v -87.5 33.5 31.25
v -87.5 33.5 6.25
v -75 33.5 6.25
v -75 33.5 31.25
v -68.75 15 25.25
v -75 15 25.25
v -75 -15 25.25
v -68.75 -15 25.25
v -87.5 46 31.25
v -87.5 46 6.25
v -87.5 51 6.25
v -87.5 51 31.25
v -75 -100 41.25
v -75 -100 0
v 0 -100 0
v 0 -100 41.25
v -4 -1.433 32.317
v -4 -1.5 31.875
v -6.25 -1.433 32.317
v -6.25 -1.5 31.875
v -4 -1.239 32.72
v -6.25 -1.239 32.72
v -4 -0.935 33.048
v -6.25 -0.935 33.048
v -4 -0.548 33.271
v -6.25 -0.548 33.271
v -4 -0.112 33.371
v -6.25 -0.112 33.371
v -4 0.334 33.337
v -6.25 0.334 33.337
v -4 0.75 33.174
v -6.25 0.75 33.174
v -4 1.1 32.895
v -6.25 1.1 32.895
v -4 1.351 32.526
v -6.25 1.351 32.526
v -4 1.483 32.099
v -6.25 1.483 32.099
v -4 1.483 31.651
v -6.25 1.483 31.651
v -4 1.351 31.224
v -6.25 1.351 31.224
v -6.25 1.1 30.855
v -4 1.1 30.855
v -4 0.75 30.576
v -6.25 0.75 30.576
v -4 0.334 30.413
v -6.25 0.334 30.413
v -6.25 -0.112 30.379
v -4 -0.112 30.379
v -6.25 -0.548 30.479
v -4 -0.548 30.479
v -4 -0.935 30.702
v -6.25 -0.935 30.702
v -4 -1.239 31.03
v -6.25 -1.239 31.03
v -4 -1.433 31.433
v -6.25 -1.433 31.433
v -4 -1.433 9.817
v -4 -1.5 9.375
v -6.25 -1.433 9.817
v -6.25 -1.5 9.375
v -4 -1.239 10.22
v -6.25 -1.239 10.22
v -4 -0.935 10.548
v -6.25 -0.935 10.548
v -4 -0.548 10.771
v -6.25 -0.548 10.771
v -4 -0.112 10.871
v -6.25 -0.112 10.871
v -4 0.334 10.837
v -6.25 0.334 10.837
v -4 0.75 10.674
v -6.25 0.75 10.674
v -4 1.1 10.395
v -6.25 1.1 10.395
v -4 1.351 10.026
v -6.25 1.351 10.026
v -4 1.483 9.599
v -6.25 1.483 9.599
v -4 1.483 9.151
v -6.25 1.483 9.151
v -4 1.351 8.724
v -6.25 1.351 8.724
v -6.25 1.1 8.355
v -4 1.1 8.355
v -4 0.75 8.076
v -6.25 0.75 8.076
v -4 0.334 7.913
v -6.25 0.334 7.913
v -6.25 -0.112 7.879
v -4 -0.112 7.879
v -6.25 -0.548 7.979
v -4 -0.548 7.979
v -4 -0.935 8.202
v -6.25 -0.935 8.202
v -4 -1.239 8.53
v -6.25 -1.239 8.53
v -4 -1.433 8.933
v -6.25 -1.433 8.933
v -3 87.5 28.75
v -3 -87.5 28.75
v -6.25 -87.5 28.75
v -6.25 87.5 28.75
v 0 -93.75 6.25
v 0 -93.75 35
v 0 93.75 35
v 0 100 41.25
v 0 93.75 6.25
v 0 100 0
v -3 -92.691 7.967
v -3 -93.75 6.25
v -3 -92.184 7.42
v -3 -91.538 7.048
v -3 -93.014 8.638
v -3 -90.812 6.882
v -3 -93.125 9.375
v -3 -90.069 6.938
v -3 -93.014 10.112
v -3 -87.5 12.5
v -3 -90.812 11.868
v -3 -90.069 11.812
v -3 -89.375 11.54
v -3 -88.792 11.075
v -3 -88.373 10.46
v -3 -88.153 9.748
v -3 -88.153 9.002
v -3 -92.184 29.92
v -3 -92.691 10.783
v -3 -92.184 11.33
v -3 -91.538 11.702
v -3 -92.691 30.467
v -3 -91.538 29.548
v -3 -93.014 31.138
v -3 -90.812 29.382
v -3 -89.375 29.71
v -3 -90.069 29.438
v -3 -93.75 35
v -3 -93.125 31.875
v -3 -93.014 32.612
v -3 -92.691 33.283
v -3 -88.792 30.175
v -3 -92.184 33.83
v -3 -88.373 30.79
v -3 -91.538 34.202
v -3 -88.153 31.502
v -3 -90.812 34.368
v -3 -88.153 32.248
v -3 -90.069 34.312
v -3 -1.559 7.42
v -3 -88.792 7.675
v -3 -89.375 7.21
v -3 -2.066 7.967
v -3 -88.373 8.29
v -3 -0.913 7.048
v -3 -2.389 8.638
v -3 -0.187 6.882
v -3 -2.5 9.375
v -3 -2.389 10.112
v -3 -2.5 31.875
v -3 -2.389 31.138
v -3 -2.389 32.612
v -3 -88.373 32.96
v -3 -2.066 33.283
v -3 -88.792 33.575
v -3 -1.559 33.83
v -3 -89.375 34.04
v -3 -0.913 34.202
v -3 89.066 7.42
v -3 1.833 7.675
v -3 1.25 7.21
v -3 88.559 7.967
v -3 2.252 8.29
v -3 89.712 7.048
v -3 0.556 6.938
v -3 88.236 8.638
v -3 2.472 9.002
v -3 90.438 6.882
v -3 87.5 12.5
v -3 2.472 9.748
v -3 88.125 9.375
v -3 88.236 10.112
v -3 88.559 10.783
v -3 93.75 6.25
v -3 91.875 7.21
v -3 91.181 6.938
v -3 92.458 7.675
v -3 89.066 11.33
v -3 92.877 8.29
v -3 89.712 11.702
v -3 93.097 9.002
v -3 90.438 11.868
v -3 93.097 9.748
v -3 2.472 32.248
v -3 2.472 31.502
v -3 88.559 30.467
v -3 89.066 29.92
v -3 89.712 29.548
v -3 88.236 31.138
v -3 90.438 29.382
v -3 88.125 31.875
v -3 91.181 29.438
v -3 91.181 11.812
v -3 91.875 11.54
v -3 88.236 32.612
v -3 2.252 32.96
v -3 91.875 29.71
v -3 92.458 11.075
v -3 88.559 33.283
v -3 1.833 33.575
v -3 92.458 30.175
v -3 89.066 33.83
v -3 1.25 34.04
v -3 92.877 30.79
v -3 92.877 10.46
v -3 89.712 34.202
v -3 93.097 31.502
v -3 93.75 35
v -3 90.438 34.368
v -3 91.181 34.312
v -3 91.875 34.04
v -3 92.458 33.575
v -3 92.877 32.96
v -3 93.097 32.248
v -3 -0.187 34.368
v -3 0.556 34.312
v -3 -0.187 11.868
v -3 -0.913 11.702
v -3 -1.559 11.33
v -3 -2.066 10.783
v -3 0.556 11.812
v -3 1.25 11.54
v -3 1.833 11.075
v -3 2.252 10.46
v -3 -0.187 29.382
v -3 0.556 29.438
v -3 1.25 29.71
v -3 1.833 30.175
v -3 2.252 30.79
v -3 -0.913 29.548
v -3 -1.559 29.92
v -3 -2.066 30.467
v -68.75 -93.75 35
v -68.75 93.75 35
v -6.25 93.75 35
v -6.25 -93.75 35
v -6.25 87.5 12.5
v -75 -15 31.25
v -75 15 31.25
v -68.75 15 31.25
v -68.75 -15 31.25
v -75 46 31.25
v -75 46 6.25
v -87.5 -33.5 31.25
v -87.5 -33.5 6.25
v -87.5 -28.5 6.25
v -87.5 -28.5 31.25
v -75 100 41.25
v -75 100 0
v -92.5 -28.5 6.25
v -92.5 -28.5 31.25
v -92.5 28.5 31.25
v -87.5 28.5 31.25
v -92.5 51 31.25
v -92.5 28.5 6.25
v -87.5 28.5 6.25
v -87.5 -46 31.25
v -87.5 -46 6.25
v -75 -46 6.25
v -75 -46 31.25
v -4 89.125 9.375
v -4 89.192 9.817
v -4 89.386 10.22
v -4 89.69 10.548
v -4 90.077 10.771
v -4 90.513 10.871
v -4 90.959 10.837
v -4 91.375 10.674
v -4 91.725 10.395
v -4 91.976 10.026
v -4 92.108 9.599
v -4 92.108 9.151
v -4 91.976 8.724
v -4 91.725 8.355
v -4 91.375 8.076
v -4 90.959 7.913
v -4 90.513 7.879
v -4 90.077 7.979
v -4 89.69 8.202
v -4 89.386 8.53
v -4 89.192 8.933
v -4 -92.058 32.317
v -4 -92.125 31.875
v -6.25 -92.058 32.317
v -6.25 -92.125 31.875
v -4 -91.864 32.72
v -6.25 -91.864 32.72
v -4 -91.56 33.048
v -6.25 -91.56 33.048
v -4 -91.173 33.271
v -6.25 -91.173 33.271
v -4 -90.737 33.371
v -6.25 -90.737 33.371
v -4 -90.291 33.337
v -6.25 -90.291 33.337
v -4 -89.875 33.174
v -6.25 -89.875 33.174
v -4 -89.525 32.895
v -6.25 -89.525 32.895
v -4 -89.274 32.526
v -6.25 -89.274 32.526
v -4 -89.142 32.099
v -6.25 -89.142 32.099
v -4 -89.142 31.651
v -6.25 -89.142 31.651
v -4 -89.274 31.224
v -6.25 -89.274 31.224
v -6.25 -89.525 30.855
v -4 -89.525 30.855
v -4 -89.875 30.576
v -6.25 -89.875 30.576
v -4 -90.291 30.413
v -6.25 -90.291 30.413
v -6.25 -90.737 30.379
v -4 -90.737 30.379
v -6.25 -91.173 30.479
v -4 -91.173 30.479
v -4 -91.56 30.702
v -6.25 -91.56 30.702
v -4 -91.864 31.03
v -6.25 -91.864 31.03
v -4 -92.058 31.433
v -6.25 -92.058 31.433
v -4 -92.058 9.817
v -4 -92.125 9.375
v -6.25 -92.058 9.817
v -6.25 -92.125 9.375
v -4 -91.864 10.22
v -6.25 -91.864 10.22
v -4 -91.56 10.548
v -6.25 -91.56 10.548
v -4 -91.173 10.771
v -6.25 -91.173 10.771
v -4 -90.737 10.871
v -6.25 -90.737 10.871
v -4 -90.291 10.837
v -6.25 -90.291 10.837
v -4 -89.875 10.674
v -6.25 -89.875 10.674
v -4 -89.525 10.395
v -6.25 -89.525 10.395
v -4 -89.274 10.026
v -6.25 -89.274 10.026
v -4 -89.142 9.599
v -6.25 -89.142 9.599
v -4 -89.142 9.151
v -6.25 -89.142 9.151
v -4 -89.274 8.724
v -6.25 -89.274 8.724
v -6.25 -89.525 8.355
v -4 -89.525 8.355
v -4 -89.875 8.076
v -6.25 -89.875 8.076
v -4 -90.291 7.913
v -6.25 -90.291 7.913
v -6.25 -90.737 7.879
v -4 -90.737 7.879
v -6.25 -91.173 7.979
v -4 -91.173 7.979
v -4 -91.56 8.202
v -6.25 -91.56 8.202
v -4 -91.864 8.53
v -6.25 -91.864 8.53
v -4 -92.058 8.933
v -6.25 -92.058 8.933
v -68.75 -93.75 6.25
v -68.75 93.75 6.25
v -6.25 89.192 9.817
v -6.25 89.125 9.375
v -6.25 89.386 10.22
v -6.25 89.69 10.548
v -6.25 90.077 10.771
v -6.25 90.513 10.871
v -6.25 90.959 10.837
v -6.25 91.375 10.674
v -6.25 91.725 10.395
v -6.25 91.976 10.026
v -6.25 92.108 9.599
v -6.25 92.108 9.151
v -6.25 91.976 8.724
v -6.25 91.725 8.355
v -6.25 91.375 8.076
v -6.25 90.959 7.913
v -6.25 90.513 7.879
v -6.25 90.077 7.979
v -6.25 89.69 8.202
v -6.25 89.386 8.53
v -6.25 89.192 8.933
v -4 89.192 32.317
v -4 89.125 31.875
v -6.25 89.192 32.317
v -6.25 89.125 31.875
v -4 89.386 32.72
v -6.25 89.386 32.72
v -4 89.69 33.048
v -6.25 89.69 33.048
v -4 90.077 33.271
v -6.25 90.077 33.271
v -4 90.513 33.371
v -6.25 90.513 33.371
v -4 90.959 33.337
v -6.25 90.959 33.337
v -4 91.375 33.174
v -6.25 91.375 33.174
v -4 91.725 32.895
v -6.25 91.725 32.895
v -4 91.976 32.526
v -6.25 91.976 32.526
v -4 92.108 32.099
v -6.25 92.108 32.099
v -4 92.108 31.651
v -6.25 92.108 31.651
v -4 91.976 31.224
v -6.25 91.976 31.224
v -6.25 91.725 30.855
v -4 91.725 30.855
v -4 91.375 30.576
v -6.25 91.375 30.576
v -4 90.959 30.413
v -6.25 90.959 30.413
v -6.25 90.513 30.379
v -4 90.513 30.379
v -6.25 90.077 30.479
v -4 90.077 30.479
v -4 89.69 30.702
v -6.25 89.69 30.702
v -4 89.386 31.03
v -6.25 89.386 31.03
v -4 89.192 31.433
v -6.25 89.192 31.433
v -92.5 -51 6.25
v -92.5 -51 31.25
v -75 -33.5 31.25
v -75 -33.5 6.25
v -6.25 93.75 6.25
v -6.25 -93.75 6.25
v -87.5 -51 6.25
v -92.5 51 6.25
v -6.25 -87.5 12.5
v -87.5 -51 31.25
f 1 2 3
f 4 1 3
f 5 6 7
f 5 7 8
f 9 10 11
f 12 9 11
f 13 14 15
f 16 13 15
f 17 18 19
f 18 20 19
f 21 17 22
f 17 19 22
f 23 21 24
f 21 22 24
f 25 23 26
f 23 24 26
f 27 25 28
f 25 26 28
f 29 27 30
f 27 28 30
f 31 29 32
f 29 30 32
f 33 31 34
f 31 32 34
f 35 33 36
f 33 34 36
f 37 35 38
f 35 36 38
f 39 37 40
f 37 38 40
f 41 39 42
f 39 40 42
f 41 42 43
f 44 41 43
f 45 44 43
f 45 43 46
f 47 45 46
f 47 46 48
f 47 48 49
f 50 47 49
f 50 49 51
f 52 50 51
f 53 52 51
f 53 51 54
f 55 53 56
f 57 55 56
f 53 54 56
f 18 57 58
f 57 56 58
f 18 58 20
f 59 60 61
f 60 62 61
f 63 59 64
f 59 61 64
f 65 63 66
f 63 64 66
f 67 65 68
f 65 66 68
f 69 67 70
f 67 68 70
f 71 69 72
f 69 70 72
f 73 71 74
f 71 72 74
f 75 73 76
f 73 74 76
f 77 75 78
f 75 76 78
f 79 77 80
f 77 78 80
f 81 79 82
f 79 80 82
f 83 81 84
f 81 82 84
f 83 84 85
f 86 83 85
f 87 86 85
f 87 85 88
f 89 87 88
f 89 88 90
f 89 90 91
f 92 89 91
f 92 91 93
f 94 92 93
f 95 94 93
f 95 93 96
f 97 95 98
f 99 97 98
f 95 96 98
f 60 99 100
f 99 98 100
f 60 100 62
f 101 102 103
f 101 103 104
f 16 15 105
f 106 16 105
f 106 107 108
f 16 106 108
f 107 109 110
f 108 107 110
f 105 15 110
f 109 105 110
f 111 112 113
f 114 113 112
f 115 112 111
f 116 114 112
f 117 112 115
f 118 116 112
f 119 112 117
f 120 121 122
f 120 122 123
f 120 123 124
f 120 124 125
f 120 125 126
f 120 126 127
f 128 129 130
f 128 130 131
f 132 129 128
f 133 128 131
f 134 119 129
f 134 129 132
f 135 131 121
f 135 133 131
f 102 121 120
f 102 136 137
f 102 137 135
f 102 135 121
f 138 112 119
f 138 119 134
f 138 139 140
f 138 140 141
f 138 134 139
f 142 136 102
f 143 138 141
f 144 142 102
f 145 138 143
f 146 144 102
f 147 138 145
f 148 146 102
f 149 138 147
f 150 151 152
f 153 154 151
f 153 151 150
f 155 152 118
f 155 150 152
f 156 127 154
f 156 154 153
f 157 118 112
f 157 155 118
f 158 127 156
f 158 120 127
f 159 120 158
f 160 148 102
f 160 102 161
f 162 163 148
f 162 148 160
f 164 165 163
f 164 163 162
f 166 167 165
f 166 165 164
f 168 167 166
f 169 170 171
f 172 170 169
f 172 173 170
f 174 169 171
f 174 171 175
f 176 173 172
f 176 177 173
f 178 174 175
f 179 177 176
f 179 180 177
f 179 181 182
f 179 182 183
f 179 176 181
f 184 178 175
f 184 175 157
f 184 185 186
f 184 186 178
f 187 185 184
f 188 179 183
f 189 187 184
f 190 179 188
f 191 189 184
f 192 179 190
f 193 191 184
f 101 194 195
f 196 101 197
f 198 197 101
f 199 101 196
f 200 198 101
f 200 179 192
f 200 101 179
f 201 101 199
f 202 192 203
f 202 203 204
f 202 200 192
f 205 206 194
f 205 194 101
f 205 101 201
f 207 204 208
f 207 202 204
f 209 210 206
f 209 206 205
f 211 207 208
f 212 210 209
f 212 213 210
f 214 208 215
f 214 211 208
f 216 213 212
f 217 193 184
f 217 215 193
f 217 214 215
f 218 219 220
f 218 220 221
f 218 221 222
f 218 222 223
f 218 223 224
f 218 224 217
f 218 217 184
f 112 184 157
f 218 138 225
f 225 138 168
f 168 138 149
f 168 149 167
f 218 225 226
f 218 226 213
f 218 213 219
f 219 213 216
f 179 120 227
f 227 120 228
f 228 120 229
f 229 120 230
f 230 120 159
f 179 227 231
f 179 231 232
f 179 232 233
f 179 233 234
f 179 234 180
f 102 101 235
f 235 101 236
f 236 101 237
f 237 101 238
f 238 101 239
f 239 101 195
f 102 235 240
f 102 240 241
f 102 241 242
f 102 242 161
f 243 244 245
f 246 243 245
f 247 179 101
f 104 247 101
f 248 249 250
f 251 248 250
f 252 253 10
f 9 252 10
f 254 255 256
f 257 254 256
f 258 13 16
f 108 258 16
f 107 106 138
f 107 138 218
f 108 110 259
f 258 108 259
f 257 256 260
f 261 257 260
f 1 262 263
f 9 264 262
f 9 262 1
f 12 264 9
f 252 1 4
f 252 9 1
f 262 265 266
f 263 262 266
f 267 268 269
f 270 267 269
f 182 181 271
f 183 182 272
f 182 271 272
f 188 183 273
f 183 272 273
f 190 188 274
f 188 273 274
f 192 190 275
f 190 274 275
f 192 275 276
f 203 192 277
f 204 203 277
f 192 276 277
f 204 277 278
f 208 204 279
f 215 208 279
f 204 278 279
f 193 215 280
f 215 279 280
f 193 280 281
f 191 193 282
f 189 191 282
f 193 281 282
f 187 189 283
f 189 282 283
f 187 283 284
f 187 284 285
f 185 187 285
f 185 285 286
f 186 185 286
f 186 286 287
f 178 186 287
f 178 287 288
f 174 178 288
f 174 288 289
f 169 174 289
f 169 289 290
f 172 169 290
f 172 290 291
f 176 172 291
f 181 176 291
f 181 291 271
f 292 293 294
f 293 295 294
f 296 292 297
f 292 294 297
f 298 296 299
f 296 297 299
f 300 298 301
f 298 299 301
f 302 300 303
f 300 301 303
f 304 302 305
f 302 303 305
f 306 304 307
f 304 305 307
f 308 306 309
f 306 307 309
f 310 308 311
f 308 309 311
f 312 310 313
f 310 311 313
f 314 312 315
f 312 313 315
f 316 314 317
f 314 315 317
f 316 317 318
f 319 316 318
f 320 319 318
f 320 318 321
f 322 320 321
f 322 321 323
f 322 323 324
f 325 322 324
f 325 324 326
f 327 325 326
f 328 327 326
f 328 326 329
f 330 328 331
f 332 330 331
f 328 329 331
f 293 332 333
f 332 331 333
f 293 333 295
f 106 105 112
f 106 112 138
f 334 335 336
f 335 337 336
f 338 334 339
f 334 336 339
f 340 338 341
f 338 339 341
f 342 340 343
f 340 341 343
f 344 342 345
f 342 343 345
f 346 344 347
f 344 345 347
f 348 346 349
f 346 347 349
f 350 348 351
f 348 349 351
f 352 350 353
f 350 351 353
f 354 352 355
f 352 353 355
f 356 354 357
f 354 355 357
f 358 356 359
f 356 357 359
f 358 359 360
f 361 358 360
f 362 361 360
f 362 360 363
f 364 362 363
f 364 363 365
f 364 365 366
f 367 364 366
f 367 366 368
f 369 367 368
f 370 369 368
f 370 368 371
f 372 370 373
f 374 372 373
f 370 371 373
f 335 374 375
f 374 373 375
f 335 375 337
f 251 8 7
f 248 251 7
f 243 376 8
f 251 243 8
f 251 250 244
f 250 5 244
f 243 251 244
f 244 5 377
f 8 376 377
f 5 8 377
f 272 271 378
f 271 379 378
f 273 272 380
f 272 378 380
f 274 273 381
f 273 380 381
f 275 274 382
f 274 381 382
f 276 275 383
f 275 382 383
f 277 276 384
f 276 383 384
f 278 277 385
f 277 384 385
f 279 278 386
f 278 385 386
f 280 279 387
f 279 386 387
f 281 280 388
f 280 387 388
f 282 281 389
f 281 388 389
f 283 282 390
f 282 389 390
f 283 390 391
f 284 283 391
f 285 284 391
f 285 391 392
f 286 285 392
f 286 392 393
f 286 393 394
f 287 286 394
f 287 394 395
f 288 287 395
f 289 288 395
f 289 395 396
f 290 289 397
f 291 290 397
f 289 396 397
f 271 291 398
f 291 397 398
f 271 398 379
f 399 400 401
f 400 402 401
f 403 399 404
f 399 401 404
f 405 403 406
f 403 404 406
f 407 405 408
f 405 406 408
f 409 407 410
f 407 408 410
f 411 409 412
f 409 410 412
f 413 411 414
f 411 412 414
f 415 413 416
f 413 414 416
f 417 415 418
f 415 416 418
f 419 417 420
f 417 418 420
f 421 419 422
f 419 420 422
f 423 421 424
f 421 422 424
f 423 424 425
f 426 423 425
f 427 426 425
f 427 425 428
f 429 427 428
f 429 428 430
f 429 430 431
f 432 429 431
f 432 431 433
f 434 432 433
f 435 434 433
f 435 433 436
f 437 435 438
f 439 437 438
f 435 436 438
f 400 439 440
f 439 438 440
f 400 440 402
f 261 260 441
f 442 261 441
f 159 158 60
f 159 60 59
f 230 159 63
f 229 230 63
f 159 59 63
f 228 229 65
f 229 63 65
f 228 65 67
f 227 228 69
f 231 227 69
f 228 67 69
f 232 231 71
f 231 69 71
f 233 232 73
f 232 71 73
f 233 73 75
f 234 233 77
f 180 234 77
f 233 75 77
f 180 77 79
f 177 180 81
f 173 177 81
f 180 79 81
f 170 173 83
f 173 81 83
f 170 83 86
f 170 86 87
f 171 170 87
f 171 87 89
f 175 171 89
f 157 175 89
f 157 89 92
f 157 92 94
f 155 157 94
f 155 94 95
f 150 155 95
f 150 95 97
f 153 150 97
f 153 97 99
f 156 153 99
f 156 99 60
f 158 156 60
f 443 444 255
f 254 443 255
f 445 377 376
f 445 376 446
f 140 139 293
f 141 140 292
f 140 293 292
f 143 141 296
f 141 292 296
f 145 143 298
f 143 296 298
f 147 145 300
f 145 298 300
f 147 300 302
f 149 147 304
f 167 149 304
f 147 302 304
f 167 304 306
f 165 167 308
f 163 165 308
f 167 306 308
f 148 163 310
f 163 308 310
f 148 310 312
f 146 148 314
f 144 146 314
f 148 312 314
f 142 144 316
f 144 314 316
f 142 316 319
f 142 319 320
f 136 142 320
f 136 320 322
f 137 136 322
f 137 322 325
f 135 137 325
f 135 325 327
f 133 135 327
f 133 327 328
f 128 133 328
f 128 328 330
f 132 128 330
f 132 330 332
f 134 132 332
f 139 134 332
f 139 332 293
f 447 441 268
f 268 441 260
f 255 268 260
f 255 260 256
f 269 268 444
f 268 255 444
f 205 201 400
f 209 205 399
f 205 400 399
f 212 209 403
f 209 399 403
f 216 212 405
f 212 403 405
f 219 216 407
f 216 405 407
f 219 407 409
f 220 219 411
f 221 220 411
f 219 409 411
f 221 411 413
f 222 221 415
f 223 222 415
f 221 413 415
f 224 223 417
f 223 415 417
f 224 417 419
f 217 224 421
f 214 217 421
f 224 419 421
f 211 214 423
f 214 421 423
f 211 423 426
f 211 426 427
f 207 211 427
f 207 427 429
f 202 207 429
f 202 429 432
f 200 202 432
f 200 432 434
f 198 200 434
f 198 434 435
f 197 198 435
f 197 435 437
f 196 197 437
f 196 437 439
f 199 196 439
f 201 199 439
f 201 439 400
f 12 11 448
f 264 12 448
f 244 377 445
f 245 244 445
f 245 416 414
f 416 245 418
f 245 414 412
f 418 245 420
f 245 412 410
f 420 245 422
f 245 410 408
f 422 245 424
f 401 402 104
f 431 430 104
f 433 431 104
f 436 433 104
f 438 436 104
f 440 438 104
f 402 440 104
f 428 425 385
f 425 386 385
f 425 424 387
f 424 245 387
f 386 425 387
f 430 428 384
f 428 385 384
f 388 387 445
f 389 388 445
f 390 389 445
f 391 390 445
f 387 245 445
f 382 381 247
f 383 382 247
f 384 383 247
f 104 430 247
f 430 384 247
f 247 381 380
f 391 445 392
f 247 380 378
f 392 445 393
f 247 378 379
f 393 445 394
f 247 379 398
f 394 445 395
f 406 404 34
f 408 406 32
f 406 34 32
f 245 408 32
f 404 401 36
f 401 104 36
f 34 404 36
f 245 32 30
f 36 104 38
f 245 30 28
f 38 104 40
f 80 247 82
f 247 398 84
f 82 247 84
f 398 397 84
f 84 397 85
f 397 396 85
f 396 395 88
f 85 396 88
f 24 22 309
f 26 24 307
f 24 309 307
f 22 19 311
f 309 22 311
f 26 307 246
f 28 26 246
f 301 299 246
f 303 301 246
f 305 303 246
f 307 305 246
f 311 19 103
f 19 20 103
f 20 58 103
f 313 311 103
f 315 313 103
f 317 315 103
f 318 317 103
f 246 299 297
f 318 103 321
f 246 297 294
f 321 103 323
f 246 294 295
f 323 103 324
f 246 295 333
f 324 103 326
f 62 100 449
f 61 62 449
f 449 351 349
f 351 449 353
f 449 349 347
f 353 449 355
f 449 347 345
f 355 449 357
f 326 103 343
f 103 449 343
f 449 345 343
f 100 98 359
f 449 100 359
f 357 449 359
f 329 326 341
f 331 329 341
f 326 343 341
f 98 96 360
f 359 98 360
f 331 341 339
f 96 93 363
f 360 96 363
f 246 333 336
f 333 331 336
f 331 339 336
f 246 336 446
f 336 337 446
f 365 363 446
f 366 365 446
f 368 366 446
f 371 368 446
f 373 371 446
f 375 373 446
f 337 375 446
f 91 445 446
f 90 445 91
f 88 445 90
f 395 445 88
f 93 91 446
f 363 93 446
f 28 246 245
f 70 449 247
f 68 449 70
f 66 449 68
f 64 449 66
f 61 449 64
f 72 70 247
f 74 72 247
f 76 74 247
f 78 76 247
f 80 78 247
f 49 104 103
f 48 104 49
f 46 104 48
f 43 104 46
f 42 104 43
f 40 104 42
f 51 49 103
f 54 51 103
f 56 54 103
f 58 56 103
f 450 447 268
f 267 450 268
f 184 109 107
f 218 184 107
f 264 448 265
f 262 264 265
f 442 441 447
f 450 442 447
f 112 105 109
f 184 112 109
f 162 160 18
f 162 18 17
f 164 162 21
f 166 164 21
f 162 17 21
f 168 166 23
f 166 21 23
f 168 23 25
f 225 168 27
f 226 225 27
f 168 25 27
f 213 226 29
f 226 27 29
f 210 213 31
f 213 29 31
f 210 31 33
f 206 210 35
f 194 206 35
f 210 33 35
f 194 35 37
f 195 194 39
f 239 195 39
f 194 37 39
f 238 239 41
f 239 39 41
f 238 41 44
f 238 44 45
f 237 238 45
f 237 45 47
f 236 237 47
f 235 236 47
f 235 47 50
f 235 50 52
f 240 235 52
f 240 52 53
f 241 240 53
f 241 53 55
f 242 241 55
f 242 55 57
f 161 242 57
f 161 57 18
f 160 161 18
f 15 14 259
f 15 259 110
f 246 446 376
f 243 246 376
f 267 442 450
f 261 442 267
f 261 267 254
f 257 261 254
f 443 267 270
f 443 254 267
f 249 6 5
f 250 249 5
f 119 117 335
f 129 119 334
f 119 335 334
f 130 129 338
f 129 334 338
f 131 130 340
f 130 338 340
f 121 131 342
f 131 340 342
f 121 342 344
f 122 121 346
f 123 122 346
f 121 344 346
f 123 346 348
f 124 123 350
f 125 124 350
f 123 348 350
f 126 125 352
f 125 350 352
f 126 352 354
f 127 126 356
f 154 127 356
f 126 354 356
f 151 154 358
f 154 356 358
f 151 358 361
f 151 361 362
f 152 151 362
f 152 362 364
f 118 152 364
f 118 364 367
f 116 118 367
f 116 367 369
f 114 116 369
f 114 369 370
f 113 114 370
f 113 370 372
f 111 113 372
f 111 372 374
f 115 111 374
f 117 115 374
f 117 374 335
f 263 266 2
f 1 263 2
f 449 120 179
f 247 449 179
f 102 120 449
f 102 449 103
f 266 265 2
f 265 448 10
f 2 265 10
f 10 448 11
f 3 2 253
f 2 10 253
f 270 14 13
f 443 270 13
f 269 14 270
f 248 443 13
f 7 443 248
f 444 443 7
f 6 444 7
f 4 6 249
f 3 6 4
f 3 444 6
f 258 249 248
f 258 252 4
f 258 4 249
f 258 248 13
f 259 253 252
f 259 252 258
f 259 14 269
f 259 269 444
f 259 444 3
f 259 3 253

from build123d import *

# Parameters (mm, degrees)
F1_DEPTH        = 41.25
F0_W            = 6.25
F0_H            = 30
F2_DEPTH        = 25.25
F3_START        = 6
F2_FACE_W       = 6.25
F2_FACE_H       = 30
F3_DEPTH        = 10
F4_START        = 6.25
F4_DEPTH        = 25
F5_START        = 35
F5_DEPTH        = 6.25
F6_DEPTH        = 6.25
F7_W            = 175
F7_H            = 16.25
F8_DEPTH        = 10
F7_W_2          = 187.5
F7_H_2          = 28.75
F9_DEPTH        = 3
F11_D           = 3
F11_DEPTH       = 12
F11_CSINK_D     = 5
F11_CSINK_ANGLE = 90
F11_TIP         = 0.9012909285


with BuildPart() as f1:
    # F0 (on Top) → F1 (new body)
    with BuildSketch(Plane.XY):
        Polygon((0, -100), (0, 100), (-75, 100), (-75, 46), (-75, 33.5), (-75, 15), (-68.75, 15), (-68.75, 93.75), (-6.25, 93.75), (-6.25, -93.75), (-68.75, -93.75), (-68.75, -15), (-75, -15), (-75, -33.5), (-75, -46), (-75, -100), align=None)
    extrude(amount=F1_DEPTH)

    # F0 (on Top) → F2 (join)
    with BuildSketch(Plane.XY):
        with Locations((-71.875, 0)):
            Rectangle(F0_W, F0_H)
    extrude(amount=F2_DEPTH)

    # F2_face (on face) → F3 (join)
    with BuildSketch(Plane(origin=(-71.875, 0, 25.25), x_dir=(1, 0, 0), z_dir=(0, 0, 1)).offset(F3_START)):
        Rectangle(F2_FACE_W, F2_FACE_H)
    extrude(amount=F3_DEPTH)

    # F0 (on Top) → F4 (join)
    with BuildSketch(Plane.XY.offset(F4_START)):
        Polygon((-75, 33.5), (-75, 46), (-87.5, 46), (-87.5, 51), (-92.5, 51), (-92.5, 28.5), (-87.5, 28.5), (-87.5, 33.5), align=None)
        Polygon((-87.5, -46), (-75, -46), (-75, -33.5), (-87.5, -33.5), (-87.5, -28.5), (-92.5, -28.5), (-92.5, -51), (-87.5, -51), align=None)
    extrude(amount=F4_DEPTH)

    # F0 (on Top) → F5 (join)
    with BuildSketch(Plane.XY.offset(F5_START)):
        Polygon((-68.75, 93.75), (-68.75, 15), (-68.75, -15), (-68.75, -93.75), (-6.25, -93.75), (-6.25, 93.75), align=None)
    extrude(amount=F5_DEPTH)

    # F0 (on Top) → F6 (join)
    with BuildSketch(Plane.XY):
        Polygon((-68.75, 93.75), (-68.75, 15), (-68.75, -15), (-68.75, -93.75), (-6.25, -93.75), (-6.25, 93.75), align=None)
    extrude(amount=F6_DEPTH)

    # F7 (on face) → F8 (cut)
    with BuildSketch(Plane.YZ):
        with Locations((0, 20.625)):
            Rectangle(F7_W, F7_H)
    extrude(amount=-F8_DEPTH, mode=Mode.SUBTRACT)

    # F7 (on face) → F9 (cut)
    with BuildSketch(Plane.YZ):
        with Locations((0, 20.625)):
            Rectangle(F7_W_2, F7_H_2)
        with Locations((0, 20.625)):
            Rectangle(F7_W, F7_H, mode=Mode.SUBTRACT)
    extrude(amount=-F9_DEPTH, mode=Mode.SUBTRACT)

    # F11
    with Locations(Plane.YZ.offset(-3)):
        with Locations((-90.625, 31.875), (0, 31.875), (90.625, 31.875), (90.625, 9.375), (0, 9.375), (-90.625, 9.375)):
            CounterSinkHole(F11_D / 2, F11_CSINK_D / 2, depth=F11_DEPTH, counter_sink_angle=F11_CSINK_ANGLE)
            with Locations((0, 0, -(F11_DEPTH + F11_TIP / 2))):  # 118° drill point
                Cone(0, F11_D / 2, F11_TIP, mode=Mode.SUBTRACT)


solid = f1.part
